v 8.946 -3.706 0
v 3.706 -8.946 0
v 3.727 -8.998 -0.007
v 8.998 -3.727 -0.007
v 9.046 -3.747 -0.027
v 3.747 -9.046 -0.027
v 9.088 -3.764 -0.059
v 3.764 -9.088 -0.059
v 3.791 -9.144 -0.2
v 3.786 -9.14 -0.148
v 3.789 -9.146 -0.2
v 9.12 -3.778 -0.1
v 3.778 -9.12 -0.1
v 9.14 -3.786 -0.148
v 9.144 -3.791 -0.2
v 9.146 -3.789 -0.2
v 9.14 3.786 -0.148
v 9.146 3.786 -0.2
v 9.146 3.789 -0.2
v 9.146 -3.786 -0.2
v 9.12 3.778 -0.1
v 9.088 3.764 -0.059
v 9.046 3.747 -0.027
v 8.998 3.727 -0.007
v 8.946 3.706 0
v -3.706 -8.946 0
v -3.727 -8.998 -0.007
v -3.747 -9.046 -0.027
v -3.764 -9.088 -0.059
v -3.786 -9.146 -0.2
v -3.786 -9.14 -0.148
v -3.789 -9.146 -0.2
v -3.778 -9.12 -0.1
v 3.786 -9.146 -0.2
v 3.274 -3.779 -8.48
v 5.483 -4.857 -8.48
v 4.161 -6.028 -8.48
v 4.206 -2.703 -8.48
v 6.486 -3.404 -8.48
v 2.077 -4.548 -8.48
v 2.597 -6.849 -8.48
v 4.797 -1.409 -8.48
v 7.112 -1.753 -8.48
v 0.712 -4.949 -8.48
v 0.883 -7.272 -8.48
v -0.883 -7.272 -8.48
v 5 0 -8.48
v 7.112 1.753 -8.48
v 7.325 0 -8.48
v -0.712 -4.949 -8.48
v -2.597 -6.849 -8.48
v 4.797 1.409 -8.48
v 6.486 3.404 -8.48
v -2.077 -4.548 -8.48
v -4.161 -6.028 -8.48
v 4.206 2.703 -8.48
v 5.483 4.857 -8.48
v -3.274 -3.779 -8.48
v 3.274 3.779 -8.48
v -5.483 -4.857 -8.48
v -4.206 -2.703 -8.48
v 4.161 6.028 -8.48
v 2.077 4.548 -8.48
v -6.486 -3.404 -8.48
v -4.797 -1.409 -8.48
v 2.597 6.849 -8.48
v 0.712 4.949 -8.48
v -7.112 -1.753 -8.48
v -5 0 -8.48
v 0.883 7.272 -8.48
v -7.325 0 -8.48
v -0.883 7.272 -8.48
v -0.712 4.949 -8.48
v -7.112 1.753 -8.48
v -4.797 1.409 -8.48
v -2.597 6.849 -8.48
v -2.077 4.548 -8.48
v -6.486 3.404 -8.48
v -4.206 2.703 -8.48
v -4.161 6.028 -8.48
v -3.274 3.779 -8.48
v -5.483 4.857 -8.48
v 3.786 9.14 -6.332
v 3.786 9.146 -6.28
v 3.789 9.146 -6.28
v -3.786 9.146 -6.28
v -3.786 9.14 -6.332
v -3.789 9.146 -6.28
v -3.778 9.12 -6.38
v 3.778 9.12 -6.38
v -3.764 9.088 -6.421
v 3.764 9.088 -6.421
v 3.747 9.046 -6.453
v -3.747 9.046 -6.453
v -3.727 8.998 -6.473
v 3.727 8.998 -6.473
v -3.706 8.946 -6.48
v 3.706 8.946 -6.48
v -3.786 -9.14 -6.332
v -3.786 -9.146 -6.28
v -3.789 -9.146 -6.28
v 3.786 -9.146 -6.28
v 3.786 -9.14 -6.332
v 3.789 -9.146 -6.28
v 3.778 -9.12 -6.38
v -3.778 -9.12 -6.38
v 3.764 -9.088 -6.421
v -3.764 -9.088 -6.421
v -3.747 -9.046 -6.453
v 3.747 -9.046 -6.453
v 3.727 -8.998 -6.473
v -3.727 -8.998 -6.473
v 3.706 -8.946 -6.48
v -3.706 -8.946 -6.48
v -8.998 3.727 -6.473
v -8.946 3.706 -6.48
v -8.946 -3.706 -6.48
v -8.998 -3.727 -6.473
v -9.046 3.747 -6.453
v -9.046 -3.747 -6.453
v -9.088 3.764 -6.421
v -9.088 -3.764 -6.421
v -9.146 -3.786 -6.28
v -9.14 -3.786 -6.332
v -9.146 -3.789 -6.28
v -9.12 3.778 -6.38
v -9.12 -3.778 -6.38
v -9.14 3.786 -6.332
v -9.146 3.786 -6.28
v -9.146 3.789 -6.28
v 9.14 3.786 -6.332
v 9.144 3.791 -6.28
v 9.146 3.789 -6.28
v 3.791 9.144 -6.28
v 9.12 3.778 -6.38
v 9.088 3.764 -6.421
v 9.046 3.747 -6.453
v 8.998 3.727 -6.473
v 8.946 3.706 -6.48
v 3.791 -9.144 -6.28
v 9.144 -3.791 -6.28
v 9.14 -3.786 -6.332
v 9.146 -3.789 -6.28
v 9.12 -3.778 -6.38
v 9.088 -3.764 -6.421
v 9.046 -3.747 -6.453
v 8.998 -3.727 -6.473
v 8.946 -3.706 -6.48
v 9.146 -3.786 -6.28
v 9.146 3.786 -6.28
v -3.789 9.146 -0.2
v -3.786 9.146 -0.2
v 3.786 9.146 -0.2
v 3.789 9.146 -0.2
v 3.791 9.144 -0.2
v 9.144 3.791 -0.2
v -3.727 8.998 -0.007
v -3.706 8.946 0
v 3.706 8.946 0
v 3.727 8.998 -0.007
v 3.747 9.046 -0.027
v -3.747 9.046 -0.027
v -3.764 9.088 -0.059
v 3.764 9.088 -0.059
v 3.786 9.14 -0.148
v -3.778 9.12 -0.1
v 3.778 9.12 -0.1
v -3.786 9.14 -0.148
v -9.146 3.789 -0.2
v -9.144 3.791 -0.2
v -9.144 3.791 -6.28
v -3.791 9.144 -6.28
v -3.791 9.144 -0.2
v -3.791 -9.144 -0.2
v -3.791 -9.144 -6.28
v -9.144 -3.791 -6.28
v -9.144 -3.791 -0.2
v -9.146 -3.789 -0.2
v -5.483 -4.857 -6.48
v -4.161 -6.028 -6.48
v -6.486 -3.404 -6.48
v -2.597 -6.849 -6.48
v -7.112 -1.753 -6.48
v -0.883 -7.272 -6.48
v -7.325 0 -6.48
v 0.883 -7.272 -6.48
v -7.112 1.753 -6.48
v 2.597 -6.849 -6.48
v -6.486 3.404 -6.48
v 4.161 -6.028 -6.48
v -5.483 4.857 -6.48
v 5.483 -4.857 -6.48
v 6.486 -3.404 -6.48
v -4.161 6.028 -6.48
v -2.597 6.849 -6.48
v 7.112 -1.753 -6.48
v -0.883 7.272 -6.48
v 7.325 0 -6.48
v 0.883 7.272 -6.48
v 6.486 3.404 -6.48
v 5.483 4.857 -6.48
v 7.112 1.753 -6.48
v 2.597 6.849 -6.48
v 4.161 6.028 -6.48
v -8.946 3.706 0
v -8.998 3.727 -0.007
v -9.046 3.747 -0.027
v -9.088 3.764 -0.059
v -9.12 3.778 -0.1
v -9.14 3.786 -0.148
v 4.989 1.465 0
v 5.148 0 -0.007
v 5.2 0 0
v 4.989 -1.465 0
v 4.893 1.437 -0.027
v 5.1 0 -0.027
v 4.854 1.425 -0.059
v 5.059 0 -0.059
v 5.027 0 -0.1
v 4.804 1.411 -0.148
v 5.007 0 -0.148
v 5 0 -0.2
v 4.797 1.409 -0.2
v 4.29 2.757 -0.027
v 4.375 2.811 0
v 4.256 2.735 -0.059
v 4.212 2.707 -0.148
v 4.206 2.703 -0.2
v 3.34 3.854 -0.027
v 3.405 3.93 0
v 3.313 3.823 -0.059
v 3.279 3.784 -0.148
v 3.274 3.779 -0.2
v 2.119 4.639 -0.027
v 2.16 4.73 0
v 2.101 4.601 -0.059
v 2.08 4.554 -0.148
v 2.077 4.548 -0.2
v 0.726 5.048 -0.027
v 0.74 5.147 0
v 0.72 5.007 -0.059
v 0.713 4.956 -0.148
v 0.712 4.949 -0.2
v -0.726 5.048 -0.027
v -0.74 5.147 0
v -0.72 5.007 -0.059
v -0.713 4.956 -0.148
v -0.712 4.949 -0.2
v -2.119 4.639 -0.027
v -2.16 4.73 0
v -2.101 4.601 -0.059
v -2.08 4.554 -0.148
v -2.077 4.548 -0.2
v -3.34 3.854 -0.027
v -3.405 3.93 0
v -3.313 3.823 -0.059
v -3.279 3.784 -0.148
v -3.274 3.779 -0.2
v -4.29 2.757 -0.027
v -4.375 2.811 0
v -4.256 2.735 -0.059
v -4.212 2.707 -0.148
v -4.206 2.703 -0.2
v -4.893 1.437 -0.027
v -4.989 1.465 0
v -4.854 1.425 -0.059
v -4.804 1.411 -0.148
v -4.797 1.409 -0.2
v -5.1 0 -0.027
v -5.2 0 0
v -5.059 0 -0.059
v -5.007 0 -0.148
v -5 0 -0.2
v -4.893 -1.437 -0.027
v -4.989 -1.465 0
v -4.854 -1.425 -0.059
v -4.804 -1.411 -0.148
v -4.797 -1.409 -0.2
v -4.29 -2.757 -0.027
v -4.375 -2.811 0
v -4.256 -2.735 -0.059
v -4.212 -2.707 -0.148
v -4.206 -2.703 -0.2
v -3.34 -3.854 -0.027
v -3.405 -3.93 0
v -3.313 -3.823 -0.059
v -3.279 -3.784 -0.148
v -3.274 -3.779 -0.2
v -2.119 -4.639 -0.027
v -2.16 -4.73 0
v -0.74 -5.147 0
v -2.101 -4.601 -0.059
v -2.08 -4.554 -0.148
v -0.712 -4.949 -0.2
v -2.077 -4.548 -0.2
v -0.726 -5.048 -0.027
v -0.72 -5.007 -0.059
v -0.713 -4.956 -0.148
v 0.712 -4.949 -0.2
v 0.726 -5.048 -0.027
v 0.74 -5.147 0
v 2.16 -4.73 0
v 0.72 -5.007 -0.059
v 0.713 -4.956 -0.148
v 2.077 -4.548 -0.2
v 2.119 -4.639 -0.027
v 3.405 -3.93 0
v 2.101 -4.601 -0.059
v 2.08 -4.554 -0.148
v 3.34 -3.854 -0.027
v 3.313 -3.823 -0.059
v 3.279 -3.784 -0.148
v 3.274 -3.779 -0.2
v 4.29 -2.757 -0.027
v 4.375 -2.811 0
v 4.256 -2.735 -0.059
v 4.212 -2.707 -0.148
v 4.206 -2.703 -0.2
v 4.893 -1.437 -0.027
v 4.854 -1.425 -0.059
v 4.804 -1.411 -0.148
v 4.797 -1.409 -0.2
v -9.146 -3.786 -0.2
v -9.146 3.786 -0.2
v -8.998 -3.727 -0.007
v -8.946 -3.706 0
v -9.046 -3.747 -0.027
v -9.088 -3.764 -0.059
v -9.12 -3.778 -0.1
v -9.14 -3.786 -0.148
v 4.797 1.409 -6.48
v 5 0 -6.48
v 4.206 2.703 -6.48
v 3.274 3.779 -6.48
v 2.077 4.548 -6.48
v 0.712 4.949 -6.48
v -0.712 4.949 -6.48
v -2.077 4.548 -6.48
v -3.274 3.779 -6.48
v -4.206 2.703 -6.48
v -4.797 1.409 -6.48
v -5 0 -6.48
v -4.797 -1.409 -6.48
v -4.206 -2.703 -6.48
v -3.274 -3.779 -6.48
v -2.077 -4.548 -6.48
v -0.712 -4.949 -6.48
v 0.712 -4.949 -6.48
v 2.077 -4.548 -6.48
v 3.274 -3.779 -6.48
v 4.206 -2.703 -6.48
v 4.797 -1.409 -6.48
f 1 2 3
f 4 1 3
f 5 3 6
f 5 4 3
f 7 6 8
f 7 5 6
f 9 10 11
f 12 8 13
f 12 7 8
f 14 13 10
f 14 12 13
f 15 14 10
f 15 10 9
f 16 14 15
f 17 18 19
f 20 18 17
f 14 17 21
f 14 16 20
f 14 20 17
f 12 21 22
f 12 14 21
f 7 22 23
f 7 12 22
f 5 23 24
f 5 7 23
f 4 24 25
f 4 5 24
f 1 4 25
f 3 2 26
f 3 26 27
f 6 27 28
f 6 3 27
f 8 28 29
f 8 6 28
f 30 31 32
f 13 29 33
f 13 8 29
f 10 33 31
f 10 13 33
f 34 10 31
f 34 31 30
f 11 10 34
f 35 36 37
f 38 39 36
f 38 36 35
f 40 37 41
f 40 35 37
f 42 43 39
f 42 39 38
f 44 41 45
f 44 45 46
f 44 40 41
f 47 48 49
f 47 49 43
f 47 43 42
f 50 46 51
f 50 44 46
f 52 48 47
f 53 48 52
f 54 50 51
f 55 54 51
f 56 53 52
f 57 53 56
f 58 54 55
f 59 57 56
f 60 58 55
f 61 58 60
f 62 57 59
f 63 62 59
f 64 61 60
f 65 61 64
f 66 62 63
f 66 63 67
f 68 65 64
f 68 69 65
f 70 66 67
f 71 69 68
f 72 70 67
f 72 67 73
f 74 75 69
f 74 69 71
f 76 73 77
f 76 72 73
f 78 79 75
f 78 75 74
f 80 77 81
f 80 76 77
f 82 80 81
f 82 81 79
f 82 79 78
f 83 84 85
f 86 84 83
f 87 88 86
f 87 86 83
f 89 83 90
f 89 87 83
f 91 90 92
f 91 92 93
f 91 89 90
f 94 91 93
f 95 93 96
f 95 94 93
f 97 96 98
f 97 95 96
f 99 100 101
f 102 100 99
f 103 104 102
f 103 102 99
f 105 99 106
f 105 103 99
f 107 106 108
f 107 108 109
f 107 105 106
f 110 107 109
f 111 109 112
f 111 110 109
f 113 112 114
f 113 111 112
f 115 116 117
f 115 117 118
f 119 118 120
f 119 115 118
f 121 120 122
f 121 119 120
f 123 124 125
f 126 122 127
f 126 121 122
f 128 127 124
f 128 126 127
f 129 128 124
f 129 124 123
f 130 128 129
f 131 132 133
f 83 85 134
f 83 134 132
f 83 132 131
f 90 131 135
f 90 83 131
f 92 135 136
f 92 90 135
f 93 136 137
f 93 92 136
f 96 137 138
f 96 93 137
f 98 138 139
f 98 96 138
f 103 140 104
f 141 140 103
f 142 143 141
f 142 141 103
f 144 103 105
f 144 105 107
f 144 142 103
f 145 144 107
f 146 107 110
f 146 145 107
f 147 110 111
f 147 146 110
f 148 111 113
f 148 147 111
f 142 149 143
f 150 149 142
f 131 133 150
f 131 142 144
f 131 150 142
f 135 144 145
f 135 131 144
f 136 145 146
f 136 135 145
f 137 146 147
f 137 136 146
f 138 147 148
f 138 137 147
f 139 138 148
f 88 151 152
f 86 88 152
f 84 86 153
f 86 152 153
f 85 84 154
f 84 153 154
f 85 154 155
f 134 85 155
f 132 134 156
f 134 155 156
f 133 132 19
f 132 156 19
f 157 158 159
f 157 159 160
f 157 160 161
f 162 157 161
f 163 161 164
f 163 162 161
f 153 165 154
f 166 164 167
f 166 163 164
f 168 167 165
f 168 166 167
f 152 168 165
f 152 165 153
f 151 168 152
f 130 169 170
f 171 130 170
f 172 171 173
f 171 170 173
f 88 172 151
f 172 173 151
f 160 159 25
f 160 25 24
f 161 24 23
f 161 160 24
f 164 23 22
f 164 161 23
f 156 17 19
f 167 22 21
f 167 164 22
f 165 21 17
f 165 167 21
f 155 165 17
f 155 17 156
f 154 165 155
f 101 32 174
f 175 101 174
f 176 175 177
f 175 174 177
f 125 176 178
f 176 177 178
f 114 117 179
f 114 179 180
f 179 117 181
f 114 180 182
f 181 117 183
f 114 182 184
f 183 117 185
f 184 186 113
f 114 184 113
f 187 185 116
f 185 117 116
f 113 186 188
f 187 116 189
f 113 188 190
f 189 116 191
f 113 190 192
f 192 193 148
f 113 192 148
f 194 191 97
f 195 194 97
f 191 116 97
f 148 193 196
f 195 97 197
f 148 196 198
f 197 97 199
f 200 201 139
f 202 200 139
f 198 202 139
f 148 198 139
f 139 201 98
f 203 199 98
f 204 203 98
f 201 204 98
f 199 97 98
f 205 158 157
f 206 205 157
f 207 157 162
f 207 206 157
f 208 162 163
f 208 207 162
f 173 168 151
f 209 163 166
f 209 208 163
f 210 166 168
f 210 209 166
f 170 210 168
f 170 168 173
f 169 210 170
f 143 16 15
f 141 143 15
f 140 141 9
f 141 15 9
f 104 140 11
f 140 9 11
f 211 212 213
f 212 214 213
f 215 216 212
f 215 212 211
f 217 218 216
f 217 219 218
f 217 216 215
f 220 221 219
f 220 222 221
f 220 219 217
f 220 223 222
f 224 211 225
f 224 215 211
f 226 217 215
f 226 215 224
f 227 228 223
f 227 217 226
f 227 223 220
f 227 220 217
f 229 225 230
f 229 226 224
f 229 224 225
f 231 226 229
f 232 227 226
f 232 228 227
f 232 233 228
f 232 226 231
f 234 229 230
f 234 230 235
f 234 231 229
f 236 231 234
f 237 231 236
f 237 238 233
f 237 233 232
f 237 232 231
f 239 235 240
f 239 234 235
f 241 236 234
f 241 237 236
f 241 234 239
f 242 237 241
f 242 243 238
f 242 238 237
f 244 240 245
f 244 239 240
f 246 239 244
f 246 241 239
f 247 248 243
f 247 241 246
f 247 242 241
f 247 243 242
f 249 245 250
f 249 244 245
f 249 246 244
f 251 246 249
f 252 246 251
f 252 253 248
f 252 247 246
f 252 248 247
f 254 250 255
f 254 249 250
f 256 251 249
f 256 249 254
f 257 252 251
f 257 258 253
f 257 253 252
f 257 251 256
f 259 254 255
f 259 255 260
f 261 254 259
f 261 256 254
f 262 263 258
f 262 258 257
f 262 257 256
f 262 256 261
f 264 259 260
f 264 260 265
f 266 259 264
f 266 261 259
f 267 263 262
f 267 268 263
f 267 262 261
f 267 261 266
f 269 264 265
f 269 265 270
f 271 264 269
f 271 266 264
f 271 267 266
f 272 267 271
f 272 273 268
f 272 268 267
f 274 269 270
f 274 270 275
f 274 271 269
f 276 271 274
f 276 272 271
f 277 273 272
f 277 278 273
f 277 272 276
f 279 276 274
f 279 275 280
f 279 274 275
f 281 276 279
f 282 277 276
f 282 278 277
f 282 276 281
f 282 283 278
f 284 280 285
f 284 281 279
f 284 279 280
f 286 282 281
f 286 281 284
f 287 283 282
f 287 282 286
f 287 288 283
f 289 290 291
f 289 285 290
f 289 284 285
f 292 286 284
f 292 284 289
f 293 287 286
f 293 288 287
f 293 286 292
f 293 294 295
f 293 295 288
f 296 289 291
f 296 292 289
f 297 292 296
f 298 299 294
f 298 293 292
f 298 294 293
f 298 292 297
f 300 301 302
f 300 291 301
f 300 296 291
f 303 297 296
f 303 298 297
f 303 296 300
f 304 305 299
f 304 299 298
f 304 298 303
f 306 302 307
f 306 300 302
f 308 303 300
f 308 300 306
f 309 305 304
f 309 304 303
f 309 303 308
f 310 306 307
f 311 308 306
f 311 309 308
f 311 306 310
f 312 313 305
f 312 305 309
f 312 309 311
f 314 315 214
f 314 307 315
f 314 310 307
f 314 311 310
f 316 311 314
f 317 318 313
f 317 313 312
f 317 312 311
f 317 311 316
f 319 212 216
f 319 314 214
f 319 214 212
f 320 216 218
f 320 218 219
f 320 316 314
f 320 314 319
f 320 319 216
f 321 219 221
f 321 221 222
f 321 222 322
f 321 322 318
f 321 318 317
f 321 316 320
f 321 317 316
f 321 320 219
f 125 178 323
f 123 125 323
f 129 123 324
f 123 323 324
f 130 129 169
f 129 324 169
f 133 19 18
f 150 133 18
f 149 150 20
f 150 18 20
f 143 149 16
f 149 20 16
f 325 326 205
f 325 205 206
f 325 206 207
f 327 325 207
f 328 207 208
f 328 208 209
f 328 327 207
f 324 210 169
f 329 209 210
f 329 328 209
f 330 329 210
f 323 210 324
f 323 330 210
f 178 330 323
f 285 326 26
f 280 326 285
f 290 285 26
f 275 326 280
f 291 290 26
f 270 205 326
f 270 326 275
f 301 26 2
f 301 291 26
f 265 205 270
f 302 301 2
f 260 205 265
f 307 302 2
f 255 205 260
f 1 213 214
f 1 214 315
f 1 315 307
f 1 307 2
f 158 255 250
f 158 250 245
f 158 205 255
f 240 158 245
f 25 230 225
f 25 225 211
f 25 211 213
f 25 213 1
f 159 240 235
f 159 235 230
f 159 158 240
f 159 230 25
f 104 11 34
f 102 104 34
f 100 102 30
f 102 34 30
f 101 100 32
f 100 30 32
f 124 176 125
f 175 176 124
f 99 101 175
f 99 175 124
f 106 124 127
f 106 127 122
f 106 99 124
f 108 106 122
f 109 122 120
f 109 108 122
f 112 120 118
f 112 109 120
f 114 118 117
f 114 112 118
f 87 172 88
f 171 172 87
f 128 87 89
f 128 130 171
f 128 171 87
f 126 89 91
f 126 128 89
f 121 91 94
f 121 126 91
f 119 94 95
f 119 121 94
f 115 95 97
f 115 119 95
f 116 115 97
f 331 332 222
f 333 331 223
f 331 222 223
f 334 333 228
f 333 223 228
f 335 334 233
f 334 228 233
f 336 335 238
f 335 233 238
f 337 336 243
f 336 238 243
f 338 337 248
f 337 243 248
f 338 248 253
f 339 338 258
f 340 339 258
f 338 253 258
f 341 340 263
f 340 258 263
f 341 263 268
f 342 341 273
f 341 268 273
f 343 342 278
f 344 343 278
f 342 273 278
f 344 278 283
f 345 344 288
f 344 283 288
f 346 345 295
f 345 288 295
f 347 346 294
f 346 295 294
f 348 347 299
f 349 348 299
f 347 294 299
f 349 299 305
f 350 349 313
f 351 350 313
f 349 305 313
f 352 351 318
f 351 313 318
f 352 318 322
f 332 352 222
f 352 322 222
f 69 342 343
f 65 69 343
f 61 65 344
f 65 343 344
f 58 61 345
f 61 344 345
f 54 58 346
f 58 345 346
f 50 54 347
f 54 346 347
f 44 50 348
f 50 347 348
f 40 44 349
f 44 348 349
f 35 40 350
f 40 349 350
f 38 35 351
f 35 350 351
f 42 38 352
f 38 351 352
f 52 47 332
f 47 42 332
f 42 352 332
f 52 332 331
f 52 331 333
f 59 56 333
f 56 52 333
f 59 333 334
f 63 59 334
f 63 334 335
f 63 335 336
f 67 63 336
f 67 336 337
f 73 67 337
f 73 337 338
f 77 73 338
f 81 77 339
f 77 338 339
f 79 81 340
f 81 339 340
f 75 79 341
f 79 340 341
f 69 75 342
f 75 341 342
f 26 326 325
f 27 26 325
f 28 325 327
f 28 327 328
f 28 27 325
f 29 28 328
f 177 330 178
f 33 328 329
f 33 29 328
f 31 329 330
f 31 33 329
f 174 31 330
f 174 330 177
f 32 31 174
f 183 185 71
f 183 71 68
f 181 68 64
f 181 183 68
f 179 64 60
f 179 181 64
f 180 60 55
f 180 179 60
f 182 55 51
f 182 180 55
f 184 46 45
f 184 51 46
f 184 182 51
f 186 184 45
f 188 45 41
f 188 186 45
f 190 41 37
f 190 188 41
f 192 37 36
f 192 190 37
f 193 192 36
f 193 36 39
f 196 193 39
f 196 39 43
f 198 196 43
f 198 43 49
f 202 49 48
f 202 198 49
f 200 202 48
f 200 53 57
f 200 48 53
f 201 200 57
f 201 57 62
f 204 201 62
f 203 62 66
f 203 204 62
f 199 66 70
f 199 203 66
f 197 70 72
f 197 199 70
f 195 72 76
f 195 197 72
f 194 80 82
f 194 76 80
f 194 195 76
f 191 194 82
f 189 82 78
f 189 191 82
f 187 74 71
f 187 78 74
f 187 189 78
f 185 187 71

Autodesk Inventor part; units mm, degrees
ref_plane "YZ Plane" through (0, 0, 0) normal (1, 0, 0) x (0, 1, 0)
ref_plane "XZ Plane" through (0, 0, 0) normal (0, 1, 0) x (-1, 0, 0)
ref_plane "XY Plane" through (0, 0, 0) normal (0, 0, 1) x (1, 0, 0)
sketch "Sketch1" plane through (0, 0, 0) normal (0, 0, 1) x (1, 0, 0)
  line L0 (-12.8051, 0) -> (12.8051, 0) projected
  line L1 (9.1465, -3.7886) -> (3.7886, -9.1465)
  line L2 (3.7886, -9.1465) -> (-3.7886, -9.1465)
  line L3 (-3.7886, -9.1465) -> (-9.1465, -3.7886)
  line L4 (-9.1465, -3.7886) -> (-9.1465, 3.7886)
  line L5 (-9.1465, 3.7886) -> (-3.7886, 9.1465)
  line L6 (-3.7886, 9.1465) -> (3.7886, 9.1465)
  line L7 (3.7886, 9.1465) -> (9.1465, 3.7886)
  line L8 (9.1465, 3.7886) -> (9.1465, -3.7886)
  circle A0 centre (0, 0) radius 5
  point P0 (9.1465, 0)
  dimension "d0" = 18.293
  dimension "d1" = 10
extrude "Extrusion1" add sketch "Sketch1" against normal blind 6.48 contours L4 L5 L6 L7 L8 L0 A0 | L0 A0 L8 L1 L2 L3 L4
sketch "Sketch2" plane through (0, 0, -6.48) normal (0, 0, -1) x (-1, 0, 0)
  circle A0 centre (0, 0) radius 5 projected
  circle A1 centre (0, 0) radius 7.325
  dimension "d4" = 14.65
extrude "Extrusion2" add sketch "Sketch2" along normal blind 2
fillet "Fillet1" radius 0.2 17 edges at (0, -9.1465, 0) (-6.4676, -6.4676, 0) (6.4676, -6.4676, 0) (9.1465, 0, 0) (6.4676, 6.4676, 0) (0, 9.1465, 0) (-6.4676, 6.4676, 0) (-9.1465, 0, 0) (9.1465, 0, -6.48) (6.4676, -6.4676, -6.48) (0, -9.1465, -6.48) (-6.4676, -6.4676, -6.48) (-9.1465, 0, -6.48) (-6.4676, 6.4676, -6.48) (0, 9.1465, -6.48) (6.4676, 6.4676, -6.48) (-5, 0, 0)
thread "Thread1" size "M10x1.5" class "6H" standard "ANSI Metric M Profile" full length
properties part number "201-11" material "Steel"
